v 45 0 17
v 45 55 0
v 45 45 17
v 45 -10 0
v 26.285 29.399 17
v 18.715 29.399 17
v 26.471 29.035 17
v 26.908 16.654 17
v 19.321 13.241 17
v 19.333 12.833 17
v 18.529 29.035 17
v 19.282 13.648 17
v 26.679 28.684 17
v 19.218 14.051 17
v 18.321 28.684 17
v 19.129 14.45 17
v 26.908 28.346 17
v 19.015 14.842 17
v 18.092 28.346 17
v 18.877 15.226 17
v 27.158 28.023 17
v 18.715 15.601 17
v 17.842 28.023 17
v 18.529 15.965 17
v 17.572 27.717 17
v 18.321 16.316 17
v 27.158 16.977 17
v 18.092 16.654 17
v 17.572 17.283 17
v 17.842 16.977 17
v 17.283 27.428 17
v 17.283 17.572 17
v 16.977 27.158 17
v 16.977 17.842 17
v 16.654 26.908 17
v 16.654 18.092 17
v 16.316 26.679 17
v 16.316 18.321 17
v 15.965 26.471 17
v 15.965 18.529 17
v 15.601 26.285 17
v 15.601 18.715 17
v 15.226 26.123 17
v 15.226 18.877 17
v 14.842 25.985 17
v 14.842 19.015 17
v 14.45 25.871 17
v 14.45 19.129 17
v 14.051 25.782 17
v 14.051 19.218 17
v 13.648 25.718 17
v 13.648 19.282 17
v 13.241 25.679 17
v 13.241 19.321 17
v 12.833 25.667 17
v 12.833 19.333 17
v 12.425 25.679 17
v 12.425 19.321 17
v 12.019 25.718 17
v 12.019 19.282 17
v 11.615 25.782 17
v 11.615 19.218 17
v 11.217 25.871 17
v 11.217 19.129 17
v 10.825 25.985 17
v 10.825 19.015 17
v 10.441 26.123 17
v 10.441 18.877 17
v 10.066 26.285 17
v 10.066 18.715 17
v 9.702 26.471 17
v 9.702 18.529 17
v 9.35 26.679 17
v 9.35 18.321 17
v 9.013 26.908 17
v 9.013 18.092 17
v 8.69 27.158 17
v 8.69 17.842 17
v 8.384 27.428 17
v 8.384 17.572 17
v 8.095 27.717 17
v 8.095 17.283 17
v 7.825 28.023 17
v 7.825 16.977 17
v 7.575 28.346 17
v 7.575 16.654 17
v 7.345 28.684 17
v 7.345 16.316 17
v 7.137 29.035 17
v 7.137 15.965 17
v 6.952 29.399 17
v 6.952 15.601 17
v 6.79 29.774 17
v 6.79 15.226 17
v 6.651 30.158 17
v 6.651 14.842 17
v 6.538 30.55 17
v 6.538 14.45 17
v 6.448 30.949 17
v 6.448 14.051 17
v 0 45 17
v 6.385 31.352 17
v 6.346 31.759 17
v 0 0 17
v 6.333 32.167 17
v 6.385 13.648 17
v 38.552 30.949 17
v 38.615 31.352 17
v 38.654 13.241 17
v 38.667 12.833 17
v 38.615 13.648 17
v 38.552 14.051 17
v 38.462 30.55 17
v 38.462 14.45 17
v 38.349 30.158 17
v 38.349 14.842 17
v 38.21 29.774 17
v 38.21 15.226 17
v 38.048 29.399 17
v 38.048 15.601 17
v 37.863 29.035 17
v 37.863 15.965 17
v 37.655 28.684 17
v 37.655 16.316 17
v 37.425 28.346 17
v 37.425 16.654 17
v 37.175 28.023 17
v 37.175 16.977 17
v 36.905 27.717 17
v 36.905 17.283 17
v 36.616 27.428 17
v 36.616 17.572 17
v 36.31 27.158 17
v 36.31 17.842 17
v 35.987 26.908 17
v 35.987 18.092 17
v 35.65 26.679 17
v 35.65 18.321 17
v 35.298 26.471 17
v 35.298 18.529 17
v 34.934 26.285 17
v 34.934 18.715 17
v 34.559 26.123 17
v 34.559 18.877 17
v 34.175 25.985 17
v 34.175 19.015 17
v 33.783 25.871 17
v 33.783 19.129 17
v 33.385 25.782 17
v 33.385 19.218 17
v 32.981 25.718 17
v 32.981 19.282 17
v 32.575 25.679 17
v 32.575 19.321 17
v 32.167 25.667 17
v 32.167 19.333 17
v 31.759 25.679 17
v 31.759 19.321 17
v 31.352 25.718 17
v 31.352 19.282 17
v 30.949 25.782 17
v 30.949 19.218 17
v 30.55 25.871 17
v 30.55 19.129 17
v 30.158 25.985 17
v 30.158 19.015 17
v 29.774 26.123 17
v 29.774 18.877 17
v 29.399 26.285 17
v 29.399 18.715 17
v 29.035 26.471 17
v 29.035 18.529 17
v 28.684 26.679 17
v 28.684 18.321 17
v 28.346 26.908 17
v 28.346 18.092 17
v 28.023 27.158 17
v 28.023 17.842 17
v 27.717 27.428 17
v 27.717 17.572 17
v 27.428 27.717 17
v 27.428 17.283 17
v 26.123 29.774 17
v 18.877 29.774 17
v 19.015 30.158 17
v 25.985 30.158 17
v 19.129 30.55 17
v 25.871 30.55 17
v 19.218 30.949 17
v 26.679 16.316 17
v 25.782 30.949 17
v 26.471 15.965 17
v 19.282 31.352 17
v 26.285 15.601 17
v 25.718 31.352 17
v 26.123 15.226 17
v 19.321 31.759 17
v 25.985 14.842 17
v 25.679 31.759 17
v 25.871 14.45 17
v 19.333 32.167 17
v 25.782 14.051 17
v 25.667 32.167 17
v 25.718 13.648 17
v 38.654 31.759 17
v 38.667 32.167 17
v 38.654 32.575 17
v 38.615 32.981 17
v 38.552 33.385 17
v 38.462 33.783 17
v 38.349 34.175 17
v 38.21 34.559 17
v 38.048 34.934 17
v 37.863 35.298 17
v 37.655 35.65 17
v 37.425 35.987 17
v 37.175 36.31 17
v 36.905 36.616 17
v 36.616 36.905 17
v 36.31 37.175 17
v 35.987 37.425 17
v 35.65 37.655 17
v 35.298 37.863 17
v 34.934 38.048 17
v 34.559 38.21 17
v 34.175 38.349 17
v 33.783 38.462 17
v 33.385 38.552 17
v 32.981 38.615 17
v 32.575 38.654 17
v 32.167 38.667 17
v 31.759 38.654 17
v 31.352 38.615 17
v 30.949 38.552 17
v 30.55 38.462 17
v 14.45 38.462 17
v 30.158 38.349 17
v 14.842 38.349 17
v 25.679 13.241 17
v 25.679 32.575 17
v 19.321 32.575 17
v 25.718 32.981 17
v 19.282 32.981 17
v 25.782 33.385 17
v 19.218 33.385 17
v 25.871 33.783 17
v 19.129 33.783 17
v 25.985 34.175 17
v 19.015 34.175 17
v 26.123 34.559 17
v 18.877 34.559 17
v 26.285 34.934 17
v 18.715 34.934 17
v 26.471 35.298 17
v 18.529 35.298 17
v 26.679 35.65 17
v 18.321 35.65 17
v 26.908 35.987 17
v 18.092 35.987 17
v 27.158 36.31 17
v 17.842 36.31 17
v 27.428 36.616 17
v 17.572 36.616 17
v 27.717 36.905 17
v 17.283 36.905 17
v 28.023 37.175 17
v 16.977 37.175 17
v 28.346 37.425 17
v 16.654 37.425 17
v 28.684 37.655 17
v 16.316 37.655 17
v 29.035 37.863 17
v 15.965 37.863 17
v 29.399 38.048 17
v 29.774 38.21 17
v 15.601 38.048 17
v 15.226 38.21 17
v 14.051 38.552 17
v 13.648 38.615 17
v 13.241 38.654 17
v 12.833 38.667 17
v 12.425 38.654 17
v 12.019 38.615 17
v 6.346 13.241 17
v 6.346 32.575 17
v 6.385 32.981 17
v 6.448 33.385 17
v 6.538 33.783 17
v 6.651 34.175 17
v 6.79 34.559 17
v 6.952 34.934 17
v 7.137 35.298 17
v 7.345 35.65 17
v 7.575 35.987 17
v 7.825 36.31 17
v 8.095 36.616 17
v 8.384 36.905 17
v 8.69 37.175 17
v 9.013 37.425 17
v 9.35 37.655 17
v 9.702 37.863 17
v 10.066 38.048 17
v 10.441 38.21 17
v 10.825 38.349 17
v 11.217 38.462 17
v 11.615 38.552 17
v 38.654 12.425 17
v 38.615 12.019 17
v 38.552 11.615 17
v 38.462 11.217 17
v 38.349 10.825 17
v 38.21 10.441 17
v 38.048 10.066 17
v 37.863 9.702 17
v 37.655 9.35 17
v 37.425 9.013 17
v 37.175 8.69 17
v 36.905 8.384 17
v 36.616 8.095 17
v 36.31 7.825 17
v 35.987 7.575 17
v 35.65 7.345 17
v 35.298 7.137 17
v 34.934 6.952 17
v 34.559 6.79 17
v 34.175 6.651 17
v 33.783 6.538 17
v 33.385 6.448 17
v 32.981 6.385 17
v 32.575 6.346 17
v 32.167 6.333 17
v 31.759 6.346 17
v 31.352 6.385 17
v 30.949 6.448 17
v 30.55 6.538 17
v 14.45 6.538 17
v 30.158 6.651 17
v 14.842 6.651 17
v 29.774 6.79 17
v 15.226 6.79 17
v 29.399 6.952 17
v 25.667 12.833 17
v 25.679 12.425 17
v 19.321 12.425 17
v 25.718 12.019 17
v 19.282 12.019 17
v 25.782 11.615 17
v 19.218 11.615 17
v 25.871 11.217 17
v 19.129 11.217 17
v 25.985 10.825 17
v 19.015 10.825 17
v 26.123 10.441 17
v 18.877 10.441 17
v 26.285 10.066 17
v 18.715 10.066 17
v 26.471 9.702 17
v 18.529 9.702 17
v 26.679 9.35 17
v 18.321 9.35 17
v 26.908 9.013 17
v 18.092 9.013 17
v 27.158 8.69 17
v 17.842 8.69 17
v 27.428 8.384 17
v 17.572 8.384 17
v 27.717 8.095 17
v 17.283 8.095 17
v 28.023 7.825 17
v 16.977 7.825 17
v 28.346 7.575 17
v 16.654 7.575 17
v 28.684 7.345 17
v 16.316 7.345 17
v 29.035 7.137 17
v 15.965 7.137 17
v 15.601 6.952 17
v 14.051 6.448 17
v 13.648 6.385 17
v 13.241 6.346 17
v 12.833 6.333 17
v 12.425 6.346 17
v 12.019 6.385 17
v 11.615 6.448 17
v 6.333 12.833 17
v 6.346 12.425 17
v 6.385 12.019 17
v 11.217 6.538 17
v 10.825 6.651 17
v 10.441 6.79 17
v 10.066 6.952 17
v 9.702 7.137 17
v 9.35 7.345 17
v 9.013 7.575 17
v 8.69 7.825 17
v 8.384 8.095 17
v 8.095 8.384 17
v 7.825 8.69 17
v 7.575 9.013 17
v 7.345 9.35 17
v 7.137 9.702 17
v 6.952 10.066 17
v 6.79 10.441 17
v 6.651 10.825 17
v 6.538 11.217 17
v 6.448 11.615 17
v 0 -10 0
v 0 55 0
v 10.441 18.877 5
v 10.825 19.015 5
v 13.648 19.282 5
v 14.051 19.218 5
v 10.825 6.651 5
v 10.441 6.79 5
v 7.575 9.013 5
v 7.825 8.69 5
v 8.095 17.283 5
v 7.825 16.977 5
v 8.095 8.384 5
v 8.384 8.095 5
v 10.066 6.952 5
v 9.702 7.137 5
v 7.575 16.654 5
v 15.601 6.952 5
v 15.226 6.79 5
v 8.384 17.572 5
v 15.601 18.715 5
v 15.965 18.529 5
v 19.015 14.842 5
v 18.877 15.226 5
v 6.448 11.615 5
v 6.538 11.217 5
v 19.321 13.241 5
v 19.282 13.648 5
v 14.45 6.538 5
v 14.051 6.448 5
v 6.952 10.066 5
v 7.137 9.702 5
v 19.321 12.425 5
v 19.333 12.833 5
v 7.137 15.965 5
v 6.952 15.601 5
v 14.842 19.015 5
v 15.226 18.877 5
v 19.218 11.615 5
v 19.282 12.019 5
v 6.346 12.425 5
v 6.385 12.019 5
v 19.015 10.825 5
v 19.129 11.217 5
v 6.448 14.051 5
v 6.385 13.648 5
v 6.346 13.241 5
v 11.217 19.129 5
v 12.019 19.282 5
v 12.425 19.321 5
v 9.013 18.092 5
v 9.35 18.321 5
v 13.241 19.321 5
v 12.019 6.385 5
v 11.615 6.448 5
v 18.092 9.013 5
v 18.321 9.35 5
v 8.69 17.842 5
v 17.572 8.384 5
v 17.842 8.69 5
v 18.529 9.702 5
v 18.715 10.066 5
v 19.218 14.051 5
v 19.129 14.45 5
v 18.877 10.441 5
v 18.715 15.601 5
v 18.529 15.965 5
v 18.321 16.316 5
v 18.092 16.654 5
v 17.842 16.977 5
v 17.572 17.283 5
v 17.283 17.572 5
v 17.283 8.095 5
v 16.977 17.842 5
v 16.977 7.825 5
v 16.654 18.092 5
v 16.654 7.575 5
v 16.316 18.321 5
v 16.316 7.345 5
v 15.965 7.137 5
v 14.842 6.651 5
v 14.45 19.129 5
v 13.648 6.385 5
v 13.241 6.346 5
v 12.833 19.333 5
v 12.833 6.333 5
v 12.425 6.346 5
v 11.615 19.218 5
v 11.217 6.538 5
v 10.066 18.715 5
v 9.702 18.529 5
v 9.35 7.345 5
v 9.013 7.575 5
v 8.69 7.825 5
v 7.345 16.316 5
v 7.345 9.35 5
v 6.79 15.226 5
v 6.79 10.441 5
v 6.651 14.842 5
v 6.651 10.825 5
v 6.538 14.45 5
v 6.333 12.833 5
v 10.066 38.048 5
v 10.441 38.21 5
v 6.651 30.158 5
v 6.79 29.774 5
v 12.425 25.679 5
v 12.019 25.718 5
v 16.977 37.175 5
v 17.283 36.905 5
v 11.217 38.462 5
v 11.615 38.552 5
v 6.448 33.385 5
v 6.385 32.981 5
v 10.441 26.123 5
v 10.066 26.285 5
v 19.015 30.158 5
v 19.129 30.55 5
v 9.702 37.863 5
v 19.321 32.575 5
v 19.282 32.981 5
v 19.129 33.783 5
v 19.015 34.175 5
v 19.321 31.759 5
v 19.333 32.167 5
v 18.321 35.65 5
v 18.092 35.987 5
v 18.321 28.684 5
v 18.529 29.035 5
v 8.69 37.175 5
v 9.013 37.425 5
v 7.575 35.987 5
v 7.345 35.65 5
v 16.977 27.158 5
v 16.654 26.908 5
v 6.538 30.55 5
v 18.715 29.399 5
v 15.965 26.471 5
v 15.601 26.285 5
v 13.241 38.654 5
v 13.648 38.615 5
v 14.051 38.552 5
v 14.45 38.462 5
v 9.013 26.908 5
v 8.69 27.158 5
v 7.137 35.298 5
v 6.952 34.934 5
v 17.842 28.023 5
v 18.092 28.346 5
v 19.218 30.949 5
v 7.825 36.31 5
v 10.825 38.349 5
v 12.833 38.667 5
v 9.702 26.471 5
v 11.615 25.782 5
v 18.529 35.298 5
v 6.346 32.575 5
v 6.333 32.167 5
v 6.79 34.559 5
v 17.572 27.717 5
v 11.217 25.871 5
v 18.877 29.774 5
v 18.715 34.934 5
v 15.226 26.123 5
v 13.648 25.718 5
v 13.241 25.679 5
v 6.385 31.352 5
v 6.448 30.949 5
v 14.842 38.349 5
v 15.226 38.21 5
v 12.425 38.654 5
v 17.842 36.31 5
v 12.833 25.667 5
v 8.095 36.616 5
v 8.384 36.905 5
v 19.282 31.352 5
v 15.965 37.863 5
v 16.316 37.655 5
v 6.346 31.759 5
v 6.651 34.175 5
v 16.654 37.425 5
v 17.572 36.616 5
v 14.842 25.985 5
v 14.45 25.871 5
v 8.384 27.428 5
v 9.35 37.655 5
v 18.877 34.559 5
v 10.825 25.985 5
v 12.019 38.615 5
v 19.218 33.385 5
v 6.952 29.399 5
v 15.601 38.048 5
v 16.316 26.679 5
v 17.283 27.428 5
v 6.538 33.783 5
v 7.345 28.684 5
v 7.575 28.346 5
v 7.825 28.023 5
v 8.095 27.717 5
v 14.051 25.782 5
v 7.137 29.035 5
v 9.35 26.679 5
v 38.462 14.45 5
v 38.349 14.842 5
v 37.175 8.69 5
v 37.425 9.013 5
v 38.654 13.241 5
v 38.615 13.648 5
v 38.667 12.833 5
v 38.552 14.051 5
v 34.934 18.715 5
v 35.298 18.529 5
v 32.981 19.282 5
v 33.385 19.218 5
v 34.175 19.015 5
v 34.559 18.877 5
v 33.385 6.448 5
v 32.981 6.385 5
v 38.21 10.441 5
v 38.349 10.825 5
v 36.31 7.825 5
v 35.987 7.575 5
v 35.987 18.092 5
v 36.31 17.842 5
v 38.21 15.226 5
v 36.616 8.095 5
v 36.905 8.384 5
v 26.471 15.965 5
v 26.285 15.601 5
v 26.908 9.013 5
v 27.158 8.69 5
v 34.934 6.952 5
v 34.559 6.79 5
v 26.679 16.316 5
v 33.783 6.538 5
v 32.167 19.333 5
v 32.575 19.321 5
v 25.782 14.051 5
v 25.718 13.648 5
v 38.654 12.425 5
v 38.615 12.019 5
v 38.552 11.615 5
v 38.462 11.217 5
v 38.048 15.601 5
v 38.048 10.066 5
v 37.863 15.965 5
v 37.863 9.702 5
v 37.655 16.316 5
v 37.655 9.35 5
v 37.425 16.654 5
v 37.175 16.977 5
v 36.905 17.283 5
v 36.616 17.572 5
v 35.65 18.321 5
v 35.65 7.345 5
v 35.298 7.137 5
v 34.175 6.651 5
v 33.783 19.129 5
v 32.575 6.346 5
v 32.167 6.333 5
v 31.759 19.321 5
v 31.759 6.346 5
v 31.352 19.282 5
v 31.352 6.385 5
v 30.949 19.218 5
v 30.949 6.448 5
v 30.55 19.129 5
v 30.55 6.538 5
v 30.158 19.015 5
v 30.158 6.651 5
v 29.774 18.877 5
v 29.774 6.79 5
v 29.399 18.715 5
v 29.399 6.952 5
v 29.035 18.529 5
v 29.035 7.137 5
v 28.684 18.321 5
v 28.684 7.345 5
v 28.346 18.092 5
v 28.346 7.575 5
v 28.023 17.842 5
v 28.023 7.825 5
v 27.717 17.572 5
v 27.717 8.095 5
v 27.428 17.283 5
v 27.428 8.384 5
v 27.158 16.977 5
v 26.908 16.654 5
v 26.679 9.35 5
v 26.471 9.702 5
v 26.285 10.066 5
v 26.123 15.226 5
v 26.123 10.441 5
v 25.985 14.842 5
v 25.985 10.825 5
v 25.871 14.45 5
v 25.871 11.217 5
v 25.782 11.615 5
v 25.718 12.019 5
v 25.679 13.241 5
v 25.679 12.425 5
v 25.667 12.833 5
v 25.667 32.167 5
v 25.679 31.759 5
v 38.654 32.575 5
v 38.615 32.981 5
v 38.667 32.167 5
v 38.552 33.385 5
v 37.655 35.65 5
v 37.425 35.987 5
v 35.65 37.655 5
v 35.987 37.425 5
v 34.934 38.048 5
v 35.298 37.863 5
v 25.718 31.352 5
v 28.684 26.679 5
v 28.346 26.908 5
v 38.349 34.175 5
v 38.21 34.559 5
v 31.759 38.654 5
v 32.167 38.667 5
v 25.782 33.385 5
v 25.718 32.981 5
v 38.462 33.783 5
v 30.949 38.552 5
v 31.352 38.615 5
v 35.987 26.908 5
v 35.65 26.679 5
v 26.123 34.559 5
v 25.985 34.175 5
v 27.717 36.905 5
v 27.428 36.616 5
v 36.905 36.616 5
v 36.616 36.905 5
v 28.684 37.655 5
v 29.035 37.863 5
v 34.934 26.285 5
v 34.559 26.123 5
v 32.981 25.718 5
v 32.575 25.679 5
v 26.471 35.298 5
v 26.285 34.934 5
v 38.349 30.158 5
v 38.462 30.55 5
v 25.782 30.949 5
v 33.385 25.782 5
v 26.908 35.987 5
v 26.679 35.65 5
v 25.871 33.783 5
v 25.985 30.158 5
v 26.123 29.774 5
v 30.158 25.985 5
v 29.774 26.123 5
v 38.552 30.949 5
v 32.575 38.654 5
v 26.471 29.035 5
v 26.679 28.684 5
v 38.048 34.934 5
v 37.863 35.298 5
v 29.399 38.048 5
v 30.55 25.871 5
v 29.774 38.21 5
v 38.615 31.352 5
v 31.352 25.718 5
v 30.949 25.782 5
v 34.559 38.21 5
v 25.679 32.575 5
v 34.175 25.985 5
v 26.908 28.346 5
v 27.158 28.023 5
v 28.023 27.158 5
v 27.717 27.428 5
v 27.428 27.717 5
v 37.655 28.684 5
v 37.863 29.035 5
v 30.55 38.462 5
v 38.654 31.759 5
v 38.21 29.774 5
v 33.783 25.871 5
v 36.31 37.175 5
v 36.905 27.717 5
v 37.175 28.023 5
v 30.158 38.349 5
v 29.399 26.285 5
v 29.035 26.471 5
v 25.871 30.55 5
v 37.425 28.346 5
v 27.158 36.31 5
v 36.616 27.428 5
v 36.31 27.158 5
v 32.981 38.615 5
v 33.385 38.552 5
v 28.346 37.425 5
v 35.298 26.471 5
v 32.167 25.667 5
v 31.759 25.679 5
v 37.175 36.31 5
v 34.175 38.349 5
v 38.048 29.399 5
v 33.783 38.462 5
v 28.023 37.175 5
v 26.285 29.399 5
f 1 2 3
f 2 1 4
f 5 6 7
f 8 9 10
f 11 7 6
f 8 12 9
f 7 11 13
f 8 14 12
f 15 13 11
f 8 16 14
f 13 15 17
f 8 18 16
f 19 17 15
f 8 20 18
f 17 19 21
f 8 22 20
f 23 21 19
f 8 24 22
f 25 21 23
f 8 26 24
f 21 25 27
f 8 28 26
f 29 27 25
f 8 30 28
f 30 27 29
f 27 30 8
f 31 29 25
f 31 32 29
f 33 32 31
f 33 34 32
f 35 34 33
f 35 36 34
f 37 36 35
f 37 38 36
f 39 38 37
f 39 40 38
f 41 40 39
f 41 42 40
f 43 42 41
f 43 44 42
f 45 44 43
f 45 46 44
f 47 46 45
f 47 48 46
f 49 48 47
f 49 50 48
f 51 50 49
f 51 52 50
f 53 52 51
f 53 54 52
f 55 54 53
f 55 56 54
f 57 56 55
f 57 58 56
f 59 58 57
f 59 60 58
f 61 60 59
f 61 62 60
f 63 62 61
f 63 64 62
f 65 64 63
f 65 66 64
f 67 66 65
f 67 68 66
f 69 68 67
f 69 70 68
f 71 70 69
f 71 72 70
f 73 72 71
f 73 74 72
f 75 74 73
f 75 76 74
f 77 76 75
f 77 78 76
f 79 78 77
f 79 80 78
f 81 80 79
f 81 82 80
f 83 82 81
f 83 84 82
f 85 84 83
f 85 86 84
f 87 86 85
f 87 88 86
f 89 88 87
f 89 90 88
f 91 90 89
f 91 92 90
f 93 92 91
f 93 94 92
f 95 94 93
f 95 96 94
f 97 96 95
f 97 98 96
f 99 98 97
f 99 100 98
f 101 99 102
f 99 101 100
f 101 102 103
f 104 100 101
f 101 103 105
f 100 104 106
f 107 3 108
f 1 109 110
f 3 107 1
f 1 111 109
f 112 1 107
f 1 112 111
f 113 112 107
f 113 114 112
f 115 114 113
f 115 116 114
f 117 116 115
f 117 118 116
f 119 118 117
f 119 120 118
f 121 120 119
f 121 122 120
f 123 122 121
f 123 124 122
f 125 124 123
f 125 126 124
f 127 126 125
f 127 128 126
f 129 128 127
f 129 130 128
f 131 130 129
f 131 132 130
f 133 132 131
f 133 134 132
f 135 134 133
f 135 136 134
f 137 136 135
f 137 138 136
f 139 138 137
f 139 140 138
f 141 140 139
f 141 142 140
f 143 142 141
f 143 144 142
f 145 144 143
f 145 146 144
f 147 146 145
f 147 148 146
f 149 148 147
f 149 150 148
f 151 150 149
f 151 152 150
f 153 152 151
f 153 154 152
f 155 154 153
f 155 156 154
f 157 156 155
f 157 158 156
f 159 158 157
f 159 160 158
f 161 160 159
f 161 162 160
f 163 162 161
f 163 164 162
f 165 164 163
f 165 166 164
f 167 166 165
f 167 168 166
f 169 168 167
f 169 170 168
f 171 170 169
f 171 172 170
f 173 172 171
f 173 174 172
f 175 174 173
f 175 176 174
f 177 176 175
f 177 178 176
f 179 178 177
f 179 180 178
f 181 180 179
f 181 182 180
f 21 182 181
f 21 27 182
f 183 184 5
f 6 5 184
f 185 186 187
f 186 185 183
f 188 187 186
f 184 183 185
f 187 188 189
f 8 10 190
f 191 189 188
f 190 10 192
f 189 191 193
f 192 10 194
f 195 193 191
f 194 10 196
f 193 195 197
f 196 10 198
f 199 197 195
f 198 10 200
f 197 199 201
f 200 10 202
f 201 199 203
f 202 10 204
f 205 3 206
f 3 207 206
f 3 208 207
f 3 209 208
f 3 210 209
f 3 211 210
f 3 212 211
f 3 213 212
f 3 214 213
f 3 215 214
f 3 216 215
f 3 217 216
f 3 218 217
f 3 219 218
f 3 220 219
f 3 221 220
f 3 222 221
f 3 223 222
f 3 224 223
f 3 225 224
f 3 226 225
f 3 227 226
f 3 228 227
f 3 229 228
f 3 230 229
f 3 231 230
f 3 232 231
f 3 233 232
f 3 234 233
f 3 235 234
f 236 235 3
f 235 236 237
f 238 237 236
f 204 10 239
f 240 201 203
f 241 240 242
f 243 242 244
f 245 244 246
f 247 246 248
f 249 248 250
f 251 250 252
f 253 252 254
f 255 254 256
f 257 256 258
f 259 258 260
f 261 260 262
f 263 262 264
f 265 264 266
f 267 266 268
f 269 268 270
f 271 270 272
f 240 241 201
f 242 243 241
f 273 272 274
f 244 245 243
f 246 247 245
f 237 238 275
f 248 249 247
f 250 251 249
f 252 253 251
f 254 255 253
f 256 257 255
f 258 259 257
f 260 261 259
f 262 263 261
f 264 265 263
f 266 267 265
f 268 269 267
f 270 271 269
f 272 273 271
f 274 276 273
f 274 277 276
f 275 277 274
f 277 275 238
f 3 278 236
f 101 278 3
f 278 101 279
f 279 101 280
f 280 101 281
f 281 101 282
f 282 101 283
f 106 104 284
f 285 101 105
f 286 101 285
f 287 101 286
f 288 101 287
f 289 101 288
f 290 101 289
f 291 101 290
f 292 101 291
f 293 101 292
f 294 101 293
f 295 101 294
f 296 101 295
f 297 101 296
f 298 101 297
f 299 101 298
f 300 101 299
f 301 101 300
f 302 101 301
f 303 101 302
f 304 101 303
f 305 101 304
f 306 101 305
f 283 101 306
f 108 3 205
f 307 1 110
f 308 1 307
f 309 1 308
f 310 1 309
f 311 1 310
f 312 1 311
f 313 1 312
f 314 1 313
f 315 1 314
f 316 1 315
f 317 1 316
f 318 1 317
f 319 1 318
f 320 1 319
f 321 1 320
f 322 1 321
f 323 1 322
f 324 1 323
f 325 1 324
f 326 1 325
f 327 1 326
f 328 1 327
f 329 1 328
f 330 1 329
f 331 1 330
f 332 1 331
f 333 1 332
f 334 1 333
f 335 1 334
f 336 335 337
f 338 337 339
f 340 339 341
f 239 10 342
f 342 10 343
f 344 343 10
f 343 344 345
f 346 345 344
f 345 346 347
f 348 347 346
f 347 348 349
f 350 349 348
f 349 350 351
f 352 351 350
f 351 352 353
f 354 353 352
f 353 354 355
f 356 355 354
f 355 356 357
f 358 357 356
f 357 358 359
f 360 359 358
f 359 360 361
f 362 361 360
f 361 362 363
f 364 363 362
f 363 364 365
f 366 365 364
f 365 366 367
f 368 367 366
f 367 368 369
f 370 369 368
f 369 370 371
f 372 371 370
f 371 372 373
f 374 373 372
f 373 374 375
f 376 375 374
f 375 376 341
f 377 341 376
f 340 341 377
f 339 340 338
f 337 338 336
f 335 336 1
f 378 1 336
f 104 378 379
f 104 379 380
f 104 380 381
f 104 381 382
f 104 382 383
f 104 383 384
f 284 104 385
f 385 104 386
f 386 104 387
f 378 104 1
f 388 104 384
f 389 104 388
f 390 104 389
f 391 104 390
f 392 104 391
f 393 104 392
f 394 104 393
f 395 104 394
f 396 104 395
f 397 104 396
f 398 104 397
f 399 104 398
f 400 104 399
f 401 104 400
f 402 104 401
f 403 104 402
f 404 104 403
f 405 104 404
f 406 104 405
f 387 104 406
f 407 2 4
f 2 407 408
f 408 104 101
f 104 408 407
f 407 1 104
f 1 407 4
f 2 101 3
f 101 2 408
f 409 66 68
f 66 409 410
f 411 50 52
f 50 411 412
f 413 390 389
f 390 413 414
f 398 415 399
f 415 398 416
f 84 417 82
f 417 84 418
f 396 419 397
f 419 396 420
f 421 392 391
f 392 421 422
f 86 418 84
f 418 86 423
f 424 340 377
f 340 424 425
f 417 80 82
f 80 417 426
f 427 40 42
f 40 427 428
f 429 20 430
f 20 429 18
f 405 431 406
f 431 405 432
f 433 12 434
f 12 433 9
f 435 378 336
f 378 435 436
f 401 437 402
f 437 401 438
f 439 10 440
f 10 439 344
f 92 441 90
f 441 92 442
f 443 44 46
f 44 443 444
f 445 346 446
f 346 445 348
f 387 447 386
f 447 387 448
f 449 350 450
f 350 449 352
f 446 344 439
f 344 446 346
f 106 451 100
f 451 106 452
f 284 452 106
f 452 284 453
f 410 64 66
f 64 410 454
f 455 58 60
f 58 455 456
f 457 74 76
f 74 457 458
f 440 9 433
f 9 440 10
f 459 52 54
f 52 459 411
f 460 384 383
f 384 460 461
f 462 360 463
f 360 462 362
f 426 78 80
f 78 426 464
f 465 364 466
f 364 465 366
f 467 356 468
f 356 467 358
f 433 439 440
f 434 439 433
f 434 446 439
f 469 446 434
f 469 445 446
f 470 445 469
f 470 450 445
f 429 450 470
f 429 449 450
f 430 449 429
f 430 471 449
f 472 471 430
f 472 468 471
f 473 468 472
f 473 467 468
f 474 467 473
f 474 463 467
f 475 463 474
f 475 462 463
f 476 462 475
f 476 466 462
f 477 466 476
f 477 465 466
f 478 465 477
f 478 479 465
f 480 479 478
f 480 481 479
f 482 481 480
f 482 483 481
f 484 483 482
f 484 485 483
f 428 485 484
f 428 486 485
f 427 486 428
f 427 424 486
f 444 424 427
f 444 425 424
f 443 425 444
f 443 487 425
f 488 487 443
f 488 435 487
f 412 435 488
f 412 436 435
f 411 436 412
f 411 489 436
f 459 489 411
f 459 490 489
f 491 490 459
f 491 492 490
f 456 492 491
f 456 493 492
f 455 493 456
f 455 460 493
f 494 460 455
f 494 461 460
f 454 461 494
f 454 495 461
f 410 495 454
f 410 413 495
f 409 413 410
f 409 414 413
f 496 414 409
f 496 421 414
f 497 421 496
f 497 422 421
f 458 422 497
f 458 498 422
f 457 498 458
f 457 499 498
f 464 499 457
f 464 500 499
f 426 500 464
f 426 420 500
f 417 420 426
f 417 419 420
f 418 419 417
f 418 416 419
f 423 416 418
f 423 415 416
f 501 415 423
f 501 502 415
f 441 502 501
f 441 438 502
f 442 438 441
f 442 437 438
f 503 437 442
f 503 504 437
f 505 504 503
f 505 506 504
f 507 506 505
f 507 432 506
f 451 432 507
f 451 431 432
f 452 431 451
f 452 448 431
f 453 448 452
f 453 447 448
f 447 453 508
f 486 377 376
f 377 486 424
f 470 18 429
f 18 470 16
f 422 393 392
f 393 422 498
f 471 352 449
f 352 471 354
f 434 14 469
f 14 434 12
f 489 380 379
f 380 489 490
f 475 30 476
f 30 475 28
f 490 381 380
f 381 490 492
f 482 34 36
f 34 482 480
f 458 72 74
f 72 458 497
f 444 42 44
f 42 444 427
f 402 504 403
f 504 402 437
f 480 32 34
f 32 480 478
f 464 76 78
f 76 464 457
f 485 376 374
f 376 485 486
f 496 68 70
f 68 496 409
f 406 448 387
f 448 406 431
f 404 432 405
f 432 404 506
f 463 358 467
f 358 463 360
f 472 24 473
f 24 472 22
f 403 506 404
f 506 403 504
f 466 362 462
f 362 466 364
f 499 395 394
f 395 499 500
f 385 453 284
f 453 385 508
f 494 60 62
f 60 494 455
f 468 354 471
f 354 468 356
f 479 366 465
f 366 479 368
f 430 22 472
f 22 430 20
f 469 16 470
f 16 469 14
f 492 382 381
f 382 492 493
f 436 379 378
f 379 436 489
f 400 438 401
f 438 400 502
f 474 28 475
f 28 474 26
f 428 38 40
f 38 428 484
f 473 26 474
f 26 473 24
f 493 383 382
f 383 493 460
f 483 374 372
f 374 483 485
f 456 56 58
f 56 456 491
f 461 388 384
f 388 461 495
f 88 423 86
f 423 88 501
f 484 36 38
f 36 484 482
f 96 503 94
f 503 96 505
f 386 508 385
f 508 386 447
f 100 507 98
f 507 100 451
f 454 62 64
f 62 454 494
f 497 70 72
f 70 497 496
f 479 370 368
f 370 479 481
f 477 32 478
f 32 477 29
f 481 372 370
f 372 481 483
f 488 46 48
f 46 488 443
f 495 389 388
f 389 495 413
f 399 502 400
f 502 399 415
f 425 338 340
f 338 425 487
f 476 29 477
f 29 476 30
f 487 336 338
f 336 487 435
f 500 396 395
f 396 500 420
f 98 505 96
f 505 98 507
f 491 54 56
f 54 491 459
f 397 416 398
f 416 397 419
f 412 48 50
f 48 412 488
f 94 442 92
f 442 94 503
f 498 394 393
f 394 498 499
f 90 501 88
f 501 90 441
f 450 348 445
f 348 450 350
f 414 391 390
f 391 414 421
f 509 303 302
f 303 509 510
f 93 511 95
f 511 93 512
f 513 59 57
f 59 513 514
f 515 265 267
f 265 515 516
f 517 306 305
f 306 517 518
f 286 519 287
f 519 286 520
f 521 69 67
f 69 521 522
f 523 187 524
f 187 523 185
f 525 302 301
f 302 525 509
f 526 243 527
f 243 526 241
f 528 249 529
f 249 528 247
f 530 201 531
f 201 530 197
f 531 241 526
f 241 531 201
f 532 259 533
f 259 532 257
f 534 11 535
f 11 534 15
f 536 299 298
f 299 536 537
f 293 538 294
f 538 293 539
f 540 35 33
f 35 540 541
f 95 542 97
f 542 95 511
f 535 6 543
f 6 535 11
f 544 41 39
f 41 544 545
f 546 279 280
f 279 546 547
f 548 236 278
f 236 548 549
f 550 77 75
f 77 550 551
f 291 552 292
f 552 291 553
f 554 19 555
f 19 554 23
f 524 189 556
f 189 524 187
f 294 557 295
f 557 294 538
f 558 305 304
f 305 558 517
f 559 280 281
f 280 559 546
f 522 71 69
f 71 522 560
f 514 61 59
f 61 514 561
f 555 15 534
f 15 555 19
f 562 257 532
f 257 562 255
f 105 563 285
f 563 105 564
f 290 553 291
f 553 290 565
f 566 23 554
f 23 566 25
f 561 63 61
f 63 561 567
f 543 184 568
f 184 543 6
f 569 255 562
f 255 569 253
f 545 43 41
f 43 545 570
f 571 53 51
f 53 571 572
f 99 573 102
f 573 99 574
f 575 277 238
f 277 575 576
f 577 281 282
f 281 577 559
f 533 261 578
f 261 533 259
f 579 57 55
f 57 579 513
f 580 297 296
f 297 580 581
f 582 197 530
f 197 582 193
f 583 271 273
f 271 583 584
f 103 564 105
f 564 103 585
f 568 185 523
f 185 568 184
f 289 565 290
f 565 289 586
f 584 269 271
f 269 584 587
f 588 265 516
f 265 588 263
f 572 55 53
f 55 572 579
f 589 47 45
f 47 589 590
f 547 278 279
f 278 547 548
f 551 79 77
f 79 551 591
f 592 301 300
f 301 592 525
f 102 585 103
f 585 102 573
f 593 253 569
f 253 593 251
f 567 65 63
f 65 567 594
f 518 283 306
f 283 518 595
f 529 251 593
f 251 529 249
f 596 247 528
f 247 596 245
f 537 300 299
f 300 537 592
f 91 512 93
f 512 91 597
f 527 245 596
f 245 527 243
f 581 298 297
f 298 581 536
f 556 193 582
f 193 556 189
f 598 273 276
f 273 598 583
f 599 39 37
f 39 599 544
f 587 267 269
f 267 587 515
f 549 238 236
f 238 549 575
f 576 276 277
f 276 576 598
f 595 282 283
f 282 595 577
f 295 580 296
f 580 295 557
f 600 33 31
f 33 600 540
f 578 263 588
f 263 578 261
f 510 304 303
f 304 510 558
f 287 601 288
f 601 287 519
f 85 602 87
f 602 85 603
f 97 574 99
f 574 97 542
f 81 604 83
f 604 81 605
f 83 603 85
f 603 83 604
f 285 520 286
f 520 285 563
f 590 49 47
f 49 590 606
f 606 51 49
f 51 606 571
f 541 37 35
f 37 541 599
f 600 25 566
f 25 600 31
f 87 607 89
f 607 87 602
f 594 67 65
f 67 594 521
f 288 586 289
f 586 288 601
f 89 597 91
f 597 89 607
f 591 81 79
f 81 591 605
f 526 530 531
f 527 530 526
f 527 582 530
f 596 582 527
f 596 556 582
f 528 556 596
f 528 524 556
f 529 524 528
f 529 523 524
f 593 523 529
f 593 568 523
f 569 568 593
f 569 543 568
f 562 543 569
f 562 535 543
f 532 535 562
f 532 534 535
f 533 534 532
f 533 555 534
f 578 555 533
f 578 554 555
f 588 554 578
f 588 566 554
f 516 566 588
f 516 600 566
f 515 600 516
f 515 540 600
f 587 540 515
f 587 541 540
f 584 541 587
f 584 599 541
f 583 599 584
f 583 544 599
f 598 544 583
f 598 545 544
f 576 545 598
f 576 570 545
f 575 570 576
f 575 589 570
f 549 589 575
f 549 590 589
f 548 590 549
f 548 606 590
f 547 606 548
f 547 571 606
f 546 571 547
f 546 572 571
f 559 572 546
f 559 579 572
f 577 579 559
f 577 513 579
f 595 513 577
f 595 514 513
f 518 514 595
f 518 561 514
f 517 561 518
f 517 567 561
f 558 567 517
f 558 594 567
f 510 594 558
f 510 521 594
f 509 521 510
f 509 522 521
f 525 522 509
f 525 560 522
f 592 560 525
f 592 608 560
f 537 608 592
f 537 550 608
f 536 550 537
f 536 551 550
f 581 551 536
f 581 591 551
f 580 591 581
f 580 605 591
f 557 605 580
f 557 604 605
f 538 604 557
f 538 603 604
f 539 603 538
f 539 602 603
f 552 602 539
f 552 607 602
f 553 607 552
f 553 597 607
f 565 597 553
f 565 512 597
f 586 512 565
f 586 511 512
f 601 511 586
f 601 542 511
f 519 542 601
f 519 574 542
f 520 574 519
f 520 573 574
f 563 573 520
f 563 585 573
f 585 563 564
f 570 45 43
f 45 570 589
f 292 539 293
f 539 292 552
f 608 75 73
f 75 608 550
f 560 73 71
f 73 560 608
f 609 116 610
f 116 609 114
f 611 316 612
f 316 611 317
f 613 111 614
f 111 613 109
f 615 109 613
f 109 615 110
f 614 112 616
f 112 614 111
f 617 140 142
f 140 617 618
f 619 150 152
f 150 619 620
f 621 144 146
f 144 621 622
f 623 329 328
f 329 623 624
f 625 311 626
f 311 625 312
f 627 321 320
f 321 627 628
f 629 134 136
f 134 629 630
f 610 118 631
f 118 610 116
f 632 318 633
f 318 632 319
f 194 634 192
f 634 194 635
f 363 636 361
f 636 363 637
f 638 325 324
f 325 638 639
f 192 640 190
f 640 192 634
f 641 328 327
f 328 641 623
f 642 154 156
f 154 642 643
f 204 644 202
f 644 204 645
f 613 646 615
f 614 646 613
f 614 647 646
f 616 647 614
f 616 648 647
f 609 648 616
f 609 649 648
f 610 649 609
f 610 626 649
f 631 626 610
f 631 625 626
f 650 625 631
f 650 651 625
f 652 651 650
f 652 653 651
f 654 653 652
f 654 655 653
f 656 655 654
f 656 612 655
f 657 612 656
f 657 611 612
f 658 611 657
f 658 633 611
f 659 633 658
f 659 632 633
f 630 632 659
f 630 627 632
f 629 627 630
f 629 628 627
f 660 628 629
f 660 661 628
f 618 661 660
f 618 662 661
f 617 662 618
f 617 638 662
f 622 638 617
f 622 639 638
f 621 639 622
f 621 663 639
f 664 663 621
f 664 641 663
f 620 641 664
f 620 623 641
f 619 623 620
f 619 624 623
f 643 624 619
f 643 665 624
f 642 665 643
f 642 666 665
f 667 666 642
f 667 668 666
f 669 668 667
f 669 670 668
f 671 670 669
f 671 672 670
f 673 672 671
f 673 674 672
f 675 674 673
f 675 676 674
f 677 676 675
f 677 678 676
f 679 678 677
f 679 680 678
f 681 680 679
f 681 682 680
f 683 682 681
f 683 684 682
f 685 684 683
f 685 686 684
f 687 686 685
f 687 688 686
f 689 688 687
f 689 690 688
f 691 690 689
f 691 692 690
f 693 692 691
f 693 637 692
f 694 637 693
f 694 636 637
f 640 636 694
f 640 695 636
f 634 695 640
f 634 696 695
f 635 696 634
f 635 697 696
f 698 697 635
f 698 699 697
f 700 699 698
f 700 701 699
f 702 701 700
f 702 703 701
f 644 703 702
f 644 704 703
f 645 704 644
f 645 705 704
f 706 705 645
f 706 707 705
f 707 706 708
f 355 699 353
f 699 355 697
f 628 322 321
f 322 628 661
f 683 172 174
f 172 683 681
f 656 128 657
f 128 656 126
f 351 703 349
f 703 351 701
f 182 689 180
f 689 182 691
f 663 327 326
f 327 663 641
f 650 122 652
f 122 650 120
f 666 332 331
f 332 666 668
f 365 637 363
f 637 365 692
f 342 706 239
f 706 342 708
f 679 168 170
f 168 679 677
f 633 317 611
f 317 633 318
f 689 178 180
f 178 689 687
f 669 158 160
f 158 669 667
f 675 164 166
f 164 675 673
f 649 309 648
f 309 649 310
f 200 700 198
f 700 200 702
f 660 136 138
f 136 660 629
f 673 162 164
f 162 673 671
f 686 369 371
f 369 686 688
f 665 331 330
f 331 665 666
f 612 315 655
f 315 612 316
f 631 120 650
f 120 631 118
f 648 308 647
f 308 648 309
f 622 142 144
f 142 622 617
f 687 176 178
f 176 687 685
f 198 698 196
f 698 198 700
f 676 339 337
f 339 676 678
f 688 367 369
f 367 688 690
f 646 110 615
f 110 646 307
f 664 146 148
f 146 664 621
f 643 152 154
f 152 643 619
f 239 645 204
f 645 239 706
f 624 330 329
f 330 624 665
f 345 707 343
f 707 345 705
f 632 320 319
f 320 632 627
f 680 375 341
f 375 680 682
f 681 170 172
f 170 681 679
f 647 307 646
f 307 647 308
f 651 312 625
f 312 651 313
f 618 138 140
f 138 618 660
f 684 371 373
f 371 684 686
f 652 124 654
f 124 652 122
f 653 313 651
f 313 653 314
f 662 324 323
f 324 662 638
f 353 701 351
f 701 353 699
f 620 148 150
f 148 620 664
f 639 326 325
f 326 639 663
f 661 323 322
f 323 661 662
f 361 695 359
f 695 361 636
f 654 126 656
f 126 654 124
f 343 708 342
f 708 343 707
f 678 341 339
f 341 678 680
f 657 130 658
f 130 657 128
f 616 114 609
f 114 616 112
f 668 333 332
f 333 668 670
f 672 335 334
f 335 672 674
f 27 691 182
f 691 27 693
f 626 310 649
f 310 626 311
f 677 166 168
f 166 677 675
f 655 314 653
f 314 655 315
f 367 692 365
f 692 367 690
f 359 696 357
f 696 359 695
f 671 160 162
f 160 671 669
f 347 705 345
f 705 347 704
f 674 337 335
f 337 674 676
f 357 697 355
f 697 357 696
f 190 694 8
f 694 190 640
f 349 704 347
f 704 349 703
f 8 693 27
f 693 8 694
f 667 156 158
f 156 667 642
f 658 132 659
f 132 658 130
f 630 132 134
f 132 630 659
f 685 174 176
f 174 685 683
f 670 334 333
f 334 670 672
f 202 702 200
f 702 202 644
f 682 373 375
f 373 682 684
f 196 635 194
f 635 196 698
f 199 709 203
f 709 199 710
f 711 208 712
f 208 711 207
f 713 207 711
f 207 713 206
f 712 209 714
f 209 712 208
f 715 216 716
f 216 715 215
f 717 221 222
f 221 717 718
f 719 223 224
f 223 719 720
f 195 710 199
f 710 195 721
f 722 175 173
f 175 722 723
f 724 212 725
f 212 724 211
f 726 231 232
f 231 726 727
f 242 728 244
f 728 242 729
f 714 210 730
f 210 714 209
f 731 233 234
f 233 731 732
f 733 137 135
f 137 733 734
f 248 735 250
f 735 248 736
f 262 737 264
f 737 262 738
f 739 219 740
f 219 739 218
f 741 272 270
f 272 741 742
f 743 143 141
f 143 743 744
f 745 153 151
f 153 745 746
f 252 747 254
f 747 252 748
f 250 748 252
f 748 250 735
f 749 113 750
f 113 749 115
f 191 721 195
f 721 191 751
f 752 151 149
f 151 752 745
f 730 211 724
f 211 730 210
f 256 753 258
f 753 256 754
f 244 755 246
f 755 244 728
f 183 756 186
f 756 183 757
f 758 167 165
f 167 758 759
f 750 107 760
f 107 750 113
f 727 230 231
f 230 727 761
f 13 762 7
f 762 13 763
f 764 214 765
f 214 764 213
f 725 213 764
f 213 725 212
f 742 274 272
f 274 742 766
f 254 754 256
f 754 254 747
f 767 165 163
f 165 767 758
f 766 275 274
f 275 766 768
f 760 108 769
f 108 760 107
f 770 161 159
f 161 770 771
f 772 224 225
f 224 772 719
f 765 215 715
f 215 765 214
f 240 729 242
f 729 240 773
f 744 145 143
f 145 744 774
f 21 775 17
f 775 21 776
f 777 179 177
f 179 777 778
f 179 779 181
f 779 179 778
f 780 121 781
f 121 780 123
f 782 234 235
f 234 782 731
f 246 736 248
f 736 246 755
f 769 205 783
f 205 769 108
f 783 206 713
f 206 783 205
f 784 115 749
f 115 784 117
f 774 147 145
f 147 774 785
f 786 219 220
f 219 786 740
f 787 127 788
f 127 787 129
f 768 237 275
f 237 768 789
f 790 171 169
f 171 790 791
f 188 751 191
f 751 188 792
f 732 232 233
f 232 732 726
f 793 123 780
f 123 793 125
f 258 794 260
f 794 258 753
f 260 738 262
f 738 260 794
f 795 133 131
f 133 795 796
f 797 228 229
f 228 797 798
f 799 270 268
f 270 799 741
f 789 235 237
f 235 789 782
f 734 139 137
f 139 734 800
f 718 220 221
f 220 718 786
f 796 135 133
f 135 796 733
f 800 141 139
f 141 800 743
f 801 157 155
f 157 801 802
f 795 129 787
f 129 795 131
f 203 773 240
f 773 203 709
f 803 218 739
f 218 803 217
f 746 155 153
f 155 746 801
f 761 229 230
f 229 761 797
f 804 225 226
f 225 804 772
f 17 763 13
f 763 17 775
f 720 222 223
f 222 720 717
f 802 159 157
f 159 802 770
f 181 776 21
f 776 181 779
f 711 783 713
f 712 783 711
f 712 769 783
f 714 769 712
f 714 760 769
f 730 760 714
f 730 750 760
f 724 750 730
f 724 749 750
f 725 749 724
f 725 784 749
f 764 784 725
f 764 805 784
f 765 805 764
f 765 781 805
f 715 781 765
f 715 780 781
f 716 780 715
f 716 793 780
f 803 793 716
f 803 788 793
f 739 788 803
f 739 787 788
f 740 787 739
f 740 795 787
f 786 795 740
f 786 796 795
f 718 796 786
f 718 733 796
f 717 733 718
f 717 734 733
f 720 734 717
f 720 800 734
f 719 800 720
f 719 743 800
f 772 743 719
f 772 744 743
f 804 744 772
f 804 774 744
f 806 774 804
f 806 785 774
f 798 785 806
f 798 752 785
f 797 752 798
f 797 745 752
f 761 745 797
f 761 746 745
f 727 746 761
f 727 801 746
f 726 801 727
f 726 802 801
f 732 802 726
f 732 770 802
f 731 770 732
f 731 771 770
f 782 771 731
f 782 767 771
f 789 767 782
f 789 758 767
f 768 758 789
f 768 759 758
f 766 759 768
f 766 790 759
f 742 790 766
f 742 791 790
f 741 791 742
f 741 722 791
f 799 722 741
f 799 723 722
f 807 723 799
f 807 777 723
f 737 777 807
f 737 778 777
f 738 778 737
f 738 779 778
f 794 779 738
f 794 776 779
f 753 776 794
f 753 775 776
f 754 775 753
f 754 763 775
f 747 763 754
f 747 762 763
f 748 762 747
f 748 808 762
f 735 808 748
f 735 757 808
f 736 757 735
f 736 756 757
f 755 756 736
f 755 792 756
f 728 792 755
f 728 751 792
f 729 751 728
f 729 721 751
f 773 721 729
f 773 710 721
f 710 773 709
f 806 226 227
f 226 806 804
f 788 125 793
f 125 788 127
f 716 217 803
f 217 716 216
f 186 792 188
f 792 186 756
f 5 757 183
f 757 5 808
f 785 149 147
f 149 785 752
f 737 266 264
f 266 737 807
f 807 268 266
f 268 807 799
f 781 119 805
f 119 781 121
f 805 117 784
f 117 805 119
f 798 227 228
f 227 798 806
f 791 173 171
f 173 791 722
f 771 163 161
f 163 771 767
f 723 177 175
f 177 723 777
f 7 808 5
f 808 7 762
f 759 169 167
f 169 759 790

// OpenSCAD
//Created by Alexander Kutschera(alexander.kutschera@googlemail.com)
//05.07.2017
 
//Settings
bd=5; //bottom thickness in mm
d_vials=12; //vial diameter in mm (real diameter!)
min_abstand=5; //min distance between holes in mm
x_y_z_rack=[45, 45, 17]; //dimensions of the rack [length, width, heigth] in mm
hv=x_y_z_rack[2]-bd;


rv=(d_vials/2)+0.5;

anzahl_x=floor(((x_y_z_rack[0]-min_abstand)/(2*rv+min_abstand)));
anzahl_y=floor(((x_y_z_rack[1]-min_abstand)/(2*rv+min_abstand)));

abstand_x=(x_y_z_rack[0]-anzahl_x*rv*2)/(anzahl_x+1);
abstand_y=(x_y_z_rack[1]-anzahl_y*rv*2)/(anzahl_y+1);

   module prism(l, w, h){
       polyhedron(
               points=[[0,0,0], [l,0,0], [l,w,0], [0,w,0], [0,w,h], [l,w,h]],
               faces=[[0,1,2,3],[5,4,3,2],[0,4,5,1],[0,3,4],[5,2,1]]
               );
   }

for(i=[1:anzahl_x]){
    x_pos=(abstand_x*i)+(rv*2*(i-1)+rv);
    for(iy=[1:anzahl_y]) {
        y_pos=(abstand_y*i)+(rv*2*(i-1)+rv);
                          } 
                    }
 

difference() {
	union() {
        translate([0, 0, 0])
            cube(x_y_z_rack, center = false);
        translate([0, -10, 0])
            prism(x_y_z_rack[0], 10, x_y_z_rack[2]);
        translate([ x_y_z_rack[0], x_y_z_rack[1]+10, 0])
            rotate(180, [0, 0, 1]) prism(x_y_z_rack[0], 10, x_y_z_rack[2]);
            }
    
	union() {
        for(i=[1:anzahl_x]){
            x_pos=(abstand_x*i)+(rv*2*(i-1)+rv);
            for(iy=[1:anzahl_y]) {
                y_pos=(abstand_y*iy)+(rv*2*(iy-1)+rv);
                translate([x_pos, y_pos, bd])
                    cylinder(hv, rv, rv, center = false, $fn = 100);
                                    } 
                            }
            }
	}
